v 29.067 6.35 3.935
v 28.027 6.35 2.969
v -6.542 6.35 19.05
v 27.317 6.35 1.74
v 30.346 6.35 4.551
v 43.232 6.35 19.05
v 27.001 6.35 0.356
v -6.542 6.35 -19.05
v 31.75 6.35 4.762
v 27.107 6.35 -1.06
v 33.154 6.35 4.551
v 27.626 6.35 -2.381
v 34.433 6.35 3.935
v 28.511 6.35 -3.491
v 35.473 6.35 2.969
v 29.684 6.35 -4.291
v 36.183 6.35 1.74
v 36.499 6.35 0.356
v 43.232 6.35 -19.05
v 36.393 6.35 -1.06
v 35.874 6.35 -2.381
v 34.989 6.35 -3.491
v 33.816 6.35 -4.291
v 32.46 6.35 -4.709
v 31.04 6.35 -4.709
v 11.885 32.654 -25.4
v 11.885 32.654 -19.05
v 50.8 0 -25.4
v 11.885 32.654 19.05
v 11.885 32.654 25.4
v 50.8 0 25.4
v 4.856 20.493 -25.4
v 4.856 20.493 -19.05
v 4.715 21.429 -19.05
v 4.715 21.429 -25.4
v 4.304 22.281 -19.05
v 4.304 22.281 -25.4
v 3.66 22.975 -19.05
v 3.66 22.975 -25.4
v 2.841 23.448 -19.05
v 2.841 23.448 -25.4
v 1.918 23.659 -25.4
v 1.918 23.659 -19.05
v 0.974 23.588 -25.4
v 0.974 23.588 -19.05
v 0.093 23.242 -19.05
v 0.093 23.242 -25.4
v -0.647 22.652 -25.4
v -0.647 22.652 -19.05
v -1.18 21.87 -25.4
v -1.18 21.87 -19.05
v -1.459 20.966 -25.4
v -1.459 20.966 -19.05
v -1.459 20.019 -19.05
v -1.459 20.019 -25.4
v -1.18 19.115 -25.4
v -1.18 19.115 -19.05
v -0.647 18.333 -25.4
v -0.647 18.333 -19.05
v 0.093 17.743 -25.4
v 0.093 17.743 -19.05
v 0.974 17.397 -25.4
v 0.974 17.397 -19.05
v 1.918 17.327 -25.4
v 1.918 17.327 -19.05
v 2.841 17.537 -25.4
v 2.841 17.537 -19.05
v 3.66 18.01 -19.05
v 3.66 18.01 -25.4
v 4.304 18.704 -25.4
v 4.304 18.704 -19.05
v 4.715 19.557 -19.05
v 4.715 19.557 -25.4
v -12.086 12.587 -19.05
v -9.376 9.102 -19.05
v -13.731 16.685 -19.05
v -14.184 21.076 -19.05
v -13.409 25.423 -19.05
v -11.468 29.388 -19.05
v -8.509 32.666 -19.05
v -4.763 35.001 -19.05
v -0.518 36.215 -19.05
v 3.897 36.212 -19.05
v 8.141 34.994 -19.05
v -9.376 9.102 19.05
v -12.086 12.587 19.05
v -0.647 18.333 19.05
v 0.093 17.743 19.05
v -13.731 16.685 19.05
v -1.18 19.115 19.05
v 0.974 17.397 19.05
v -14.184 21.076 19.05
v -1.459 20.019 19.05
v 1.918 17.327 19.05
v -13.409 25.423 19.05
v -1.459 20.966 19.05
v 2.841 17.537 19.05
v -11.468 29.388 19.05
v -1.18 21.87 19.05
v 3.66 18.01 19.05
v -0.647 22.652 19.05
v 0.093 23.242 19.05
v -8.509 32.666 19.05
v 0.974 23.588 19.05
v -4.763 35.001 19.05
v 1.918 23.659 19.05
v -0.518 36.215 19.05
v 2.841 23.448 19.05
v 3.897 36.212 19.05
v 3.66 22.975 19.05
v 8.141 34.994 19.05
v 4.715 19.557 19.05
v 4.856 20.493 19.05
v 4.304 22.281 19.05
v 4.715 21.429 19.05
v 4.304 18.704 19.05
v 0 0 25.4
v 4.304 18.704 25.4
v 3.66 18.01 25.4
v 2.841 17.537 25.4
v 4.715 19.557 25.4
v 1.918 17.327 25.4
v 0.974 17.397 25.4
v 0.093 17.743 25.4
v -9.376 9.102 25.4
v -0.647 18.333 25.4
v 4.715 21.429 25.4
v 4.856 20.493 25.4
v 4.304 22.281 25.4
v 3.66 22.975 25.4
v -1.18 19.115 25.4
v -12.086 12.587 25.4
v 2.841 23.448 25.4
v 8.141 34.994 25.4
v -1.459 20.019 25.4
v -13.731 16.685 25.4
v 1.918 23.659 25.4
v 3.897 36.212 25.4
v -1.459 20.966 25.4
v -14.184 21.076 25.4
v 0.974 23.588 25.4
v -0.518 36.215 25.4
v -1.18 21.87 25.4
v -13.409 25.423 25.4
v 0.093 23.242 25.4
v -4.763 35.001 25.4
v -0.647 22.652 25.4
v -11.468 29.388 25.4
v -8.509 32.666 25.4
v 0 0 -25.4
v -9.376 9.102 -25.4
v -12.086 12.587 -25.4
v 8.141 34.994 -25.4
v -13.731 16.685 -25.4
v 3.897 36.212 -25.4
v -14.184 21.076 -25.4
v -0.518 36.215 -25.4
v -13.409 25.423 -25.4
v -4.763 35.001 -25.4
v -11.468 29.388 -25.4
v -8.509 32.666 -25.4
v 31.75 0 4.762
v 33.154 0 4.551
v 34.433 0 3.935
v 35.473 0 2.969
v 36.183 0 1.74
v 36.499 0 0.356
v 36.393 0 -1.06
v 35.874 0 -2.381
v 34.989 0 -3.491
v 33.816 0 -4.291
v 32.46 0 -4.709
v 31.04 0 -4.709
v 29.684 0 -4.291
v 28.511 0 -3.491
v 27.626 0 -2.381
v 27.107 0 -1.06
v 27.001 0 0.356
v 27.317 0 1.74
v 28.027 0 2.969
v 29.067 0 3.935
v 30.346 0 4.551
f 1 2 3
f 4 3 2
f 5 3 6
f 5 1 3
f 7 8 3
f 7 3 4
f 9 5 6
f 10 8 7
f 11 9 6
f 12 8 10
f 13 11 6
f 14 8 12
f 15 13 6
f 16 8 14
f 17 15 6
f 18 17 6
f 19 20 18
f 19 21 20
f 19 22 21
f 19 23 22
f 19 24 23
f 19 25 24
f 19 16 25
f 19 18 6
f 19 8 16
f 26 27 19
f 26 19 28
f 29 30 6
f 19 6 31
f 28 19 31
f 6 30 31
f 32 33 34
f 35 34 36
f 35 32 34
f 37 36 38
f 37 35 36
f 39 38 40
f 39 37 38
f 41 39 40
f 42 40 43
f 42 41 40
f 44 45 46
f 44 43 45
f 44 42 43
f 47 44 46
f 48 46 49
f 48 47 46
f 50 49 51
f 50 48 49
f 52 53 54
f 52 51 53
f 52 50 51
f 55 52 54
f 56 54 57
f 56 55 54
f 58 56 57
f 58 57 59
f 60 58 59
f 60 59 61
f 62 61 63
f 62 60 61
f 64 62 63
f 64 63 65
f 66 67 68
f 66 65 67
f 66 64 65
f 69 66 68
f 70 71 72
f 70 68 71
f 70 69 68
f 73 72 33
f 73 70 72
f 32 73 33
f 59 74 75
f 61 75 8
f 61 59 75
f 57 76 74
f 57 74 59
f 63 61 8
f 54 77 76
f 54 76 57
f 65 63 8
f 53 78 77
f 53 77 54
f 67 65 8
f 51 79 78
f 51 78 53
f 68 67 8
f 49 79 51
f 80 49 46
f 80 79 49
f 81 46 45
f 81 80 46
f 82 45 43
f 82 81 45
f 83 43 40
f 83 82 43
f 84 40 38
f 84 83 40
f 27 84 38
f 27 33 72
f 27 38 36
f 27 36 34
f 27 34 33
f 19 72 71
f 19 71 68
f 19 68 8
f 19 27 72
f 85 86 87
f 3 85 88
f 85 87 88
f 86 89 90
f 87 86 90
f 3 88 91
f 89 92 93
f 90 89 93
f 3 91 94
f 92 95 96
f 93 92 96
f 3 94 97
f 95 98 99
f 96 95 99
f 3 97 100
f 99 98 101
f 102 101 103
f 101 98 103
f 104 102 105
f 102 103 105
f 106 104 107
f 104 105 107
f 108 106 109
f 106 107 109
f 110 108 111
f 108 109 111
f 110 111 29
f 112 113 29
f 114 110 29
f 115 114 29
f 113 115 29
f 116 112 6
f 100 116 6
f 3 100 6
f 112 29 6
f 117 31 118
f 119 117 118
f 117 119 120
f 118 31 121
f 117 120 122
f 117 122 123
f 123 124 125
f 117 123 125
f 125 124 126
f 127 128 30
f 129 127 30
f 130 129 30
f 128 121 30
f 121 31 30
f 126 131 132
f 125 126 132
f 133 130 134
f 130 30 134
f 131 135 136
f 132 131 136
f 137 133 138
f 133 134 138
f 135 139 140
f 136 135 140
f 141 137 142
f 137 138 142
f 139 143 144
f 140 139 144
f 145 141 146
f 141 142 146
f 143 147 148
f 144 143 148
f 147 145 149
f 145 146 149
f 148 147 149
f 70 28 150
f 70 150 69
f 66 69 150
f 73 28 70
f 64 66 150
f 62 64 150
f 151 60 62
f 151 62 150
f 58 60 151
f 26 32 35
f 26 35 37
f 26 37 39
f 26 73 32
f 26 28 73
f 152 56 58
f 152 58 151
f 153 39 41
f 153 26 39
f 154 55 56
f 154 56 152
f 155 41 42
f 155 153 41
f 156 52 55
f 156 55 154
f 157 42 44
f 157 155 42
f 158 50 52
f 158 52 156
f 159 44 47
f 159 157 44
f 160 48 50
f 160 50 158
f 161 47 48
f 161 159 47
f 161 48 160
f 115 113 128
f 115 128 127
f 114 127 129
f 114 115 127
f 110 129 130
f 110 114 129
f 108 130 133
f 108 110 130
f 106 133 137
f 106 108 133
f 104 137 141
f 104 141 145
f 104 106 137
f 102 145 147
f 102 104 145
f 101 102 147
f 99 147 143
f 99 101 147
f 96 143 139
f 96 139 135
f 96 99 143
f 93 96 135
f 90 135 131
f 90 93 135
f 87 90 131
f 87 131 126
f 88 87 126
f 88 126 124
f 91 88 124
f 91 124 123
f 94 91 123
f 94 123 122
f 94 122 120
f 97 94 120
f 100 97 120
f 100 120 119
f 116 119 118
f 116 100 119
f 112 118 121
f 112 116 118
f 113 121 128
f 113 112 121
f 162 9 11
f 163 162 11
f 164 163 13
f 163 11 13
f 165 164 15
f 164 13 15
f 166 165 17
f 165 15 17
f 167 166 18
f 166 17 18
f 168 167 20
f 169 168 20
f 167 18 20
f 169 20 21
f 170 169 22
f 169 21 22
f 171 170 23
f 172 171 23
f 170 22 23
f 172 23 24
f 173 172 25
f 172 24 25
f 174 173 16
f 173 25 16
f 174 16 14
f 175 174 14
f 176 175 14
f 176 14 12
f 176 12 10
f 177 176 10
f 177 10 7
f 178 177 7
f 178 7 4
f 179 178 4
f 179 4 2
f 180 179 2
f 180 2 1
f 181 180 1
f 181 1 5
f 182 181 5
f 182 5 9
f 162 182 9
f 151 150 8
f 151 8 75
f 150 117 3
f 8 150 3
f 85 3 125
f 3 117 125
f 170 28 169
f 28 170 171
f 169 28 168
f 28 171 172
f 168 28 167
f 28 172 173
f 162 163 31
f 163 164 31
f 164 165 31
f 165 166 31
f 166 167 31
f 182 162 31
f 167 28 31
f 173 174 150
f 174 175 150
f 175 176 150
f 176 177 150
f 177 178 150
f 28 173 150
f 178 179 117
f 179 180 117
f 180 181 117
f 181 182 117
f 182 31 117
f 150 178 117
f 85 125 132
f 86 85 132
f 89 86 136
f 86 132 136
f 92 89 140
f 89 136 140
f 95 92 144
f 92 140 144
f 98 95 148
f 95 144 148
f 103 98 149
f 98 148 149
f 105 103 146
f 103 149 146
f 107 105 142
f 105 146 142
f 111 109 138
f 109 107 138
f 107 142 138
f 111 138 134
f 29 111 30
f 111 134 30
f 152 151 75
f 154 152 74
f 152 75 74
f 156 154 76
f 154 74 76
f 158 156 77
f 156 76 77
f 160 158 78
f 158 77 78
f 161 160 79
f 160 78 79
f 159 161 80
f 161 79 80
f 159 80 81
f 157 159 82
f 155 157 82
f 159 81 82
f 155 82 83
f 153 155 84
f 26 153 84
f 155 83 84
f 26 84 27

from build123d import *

# Parameters (mm, degrees)
SKETCH1_R           = 3.175
BOSS_EXTRUDE1_DEPTH = 25.4
CUT_EXTRUDE1_START  = 50.8
SKETCH2_W           = 64.994311014
SKETCH2_H           = 38.1
CUT_EXTRUDE1_DEPTH  = 44.45
SKETCH3_R           = 4.7625
CUT_EXTRUDE2_DEPTH  = 65.240638337


with BuildPart() as part:
    # Sketch1 → Boss-Extrude1 (new, symmetric)
    with BuildSketch(Plane.XY):
        with BuildLine():
            Line((0, 0), (-9.376460946, 9.101647163))
            ThreePointArc((-9.376460946, 9.101647163), (-10.10301176, 31.130324977), (11.88494229, 32.653610572))
            Line((11.88494229, 32.653610572), (50.8, 0))
            Line((50.8, 0), (0, 0))
        make_face()
        with Locations((1.680688986, 20.492655038)):
            Circle(SKETCH1_R, mode=Mode.SUBTRACT)
    extrude(amount=BOSS_EXTRUDE1_DEPTH, both=True)

    # Sketch2 → Cut-Extrude1 (cut)
    with BuildSketch(Plane(origin=(0, 0, 0), x_dir=(1, 0, 0), z_dir=(0, 1, 0)).offset(CUT_EXTRUDE1_START)):
        with Locations((18.302844493, 0)):
            Rectangle(SKETCH2_W, SKETCH2_H)
    extrude(amount=-CUT_EXTRUDE1_DEPTH, mode=Mode.SUBTRACT)

    # Sketch3 → Cut-Extrude2 (cut, through all)
    with BuildSketch(Plane(origin=(0, 6.35, 0), x_dir=(1, 0, 0), z_dir=(0, 1, 0))):
        with Locations(Location((31.75, 0, 0), (0, 0, 270))):
            Circle(SKETCH3_R)
    extrude(amount=-CUT_EXTRUDE2_DEPTH, mode=Mode.SUBTRACT)


solid = part.part
